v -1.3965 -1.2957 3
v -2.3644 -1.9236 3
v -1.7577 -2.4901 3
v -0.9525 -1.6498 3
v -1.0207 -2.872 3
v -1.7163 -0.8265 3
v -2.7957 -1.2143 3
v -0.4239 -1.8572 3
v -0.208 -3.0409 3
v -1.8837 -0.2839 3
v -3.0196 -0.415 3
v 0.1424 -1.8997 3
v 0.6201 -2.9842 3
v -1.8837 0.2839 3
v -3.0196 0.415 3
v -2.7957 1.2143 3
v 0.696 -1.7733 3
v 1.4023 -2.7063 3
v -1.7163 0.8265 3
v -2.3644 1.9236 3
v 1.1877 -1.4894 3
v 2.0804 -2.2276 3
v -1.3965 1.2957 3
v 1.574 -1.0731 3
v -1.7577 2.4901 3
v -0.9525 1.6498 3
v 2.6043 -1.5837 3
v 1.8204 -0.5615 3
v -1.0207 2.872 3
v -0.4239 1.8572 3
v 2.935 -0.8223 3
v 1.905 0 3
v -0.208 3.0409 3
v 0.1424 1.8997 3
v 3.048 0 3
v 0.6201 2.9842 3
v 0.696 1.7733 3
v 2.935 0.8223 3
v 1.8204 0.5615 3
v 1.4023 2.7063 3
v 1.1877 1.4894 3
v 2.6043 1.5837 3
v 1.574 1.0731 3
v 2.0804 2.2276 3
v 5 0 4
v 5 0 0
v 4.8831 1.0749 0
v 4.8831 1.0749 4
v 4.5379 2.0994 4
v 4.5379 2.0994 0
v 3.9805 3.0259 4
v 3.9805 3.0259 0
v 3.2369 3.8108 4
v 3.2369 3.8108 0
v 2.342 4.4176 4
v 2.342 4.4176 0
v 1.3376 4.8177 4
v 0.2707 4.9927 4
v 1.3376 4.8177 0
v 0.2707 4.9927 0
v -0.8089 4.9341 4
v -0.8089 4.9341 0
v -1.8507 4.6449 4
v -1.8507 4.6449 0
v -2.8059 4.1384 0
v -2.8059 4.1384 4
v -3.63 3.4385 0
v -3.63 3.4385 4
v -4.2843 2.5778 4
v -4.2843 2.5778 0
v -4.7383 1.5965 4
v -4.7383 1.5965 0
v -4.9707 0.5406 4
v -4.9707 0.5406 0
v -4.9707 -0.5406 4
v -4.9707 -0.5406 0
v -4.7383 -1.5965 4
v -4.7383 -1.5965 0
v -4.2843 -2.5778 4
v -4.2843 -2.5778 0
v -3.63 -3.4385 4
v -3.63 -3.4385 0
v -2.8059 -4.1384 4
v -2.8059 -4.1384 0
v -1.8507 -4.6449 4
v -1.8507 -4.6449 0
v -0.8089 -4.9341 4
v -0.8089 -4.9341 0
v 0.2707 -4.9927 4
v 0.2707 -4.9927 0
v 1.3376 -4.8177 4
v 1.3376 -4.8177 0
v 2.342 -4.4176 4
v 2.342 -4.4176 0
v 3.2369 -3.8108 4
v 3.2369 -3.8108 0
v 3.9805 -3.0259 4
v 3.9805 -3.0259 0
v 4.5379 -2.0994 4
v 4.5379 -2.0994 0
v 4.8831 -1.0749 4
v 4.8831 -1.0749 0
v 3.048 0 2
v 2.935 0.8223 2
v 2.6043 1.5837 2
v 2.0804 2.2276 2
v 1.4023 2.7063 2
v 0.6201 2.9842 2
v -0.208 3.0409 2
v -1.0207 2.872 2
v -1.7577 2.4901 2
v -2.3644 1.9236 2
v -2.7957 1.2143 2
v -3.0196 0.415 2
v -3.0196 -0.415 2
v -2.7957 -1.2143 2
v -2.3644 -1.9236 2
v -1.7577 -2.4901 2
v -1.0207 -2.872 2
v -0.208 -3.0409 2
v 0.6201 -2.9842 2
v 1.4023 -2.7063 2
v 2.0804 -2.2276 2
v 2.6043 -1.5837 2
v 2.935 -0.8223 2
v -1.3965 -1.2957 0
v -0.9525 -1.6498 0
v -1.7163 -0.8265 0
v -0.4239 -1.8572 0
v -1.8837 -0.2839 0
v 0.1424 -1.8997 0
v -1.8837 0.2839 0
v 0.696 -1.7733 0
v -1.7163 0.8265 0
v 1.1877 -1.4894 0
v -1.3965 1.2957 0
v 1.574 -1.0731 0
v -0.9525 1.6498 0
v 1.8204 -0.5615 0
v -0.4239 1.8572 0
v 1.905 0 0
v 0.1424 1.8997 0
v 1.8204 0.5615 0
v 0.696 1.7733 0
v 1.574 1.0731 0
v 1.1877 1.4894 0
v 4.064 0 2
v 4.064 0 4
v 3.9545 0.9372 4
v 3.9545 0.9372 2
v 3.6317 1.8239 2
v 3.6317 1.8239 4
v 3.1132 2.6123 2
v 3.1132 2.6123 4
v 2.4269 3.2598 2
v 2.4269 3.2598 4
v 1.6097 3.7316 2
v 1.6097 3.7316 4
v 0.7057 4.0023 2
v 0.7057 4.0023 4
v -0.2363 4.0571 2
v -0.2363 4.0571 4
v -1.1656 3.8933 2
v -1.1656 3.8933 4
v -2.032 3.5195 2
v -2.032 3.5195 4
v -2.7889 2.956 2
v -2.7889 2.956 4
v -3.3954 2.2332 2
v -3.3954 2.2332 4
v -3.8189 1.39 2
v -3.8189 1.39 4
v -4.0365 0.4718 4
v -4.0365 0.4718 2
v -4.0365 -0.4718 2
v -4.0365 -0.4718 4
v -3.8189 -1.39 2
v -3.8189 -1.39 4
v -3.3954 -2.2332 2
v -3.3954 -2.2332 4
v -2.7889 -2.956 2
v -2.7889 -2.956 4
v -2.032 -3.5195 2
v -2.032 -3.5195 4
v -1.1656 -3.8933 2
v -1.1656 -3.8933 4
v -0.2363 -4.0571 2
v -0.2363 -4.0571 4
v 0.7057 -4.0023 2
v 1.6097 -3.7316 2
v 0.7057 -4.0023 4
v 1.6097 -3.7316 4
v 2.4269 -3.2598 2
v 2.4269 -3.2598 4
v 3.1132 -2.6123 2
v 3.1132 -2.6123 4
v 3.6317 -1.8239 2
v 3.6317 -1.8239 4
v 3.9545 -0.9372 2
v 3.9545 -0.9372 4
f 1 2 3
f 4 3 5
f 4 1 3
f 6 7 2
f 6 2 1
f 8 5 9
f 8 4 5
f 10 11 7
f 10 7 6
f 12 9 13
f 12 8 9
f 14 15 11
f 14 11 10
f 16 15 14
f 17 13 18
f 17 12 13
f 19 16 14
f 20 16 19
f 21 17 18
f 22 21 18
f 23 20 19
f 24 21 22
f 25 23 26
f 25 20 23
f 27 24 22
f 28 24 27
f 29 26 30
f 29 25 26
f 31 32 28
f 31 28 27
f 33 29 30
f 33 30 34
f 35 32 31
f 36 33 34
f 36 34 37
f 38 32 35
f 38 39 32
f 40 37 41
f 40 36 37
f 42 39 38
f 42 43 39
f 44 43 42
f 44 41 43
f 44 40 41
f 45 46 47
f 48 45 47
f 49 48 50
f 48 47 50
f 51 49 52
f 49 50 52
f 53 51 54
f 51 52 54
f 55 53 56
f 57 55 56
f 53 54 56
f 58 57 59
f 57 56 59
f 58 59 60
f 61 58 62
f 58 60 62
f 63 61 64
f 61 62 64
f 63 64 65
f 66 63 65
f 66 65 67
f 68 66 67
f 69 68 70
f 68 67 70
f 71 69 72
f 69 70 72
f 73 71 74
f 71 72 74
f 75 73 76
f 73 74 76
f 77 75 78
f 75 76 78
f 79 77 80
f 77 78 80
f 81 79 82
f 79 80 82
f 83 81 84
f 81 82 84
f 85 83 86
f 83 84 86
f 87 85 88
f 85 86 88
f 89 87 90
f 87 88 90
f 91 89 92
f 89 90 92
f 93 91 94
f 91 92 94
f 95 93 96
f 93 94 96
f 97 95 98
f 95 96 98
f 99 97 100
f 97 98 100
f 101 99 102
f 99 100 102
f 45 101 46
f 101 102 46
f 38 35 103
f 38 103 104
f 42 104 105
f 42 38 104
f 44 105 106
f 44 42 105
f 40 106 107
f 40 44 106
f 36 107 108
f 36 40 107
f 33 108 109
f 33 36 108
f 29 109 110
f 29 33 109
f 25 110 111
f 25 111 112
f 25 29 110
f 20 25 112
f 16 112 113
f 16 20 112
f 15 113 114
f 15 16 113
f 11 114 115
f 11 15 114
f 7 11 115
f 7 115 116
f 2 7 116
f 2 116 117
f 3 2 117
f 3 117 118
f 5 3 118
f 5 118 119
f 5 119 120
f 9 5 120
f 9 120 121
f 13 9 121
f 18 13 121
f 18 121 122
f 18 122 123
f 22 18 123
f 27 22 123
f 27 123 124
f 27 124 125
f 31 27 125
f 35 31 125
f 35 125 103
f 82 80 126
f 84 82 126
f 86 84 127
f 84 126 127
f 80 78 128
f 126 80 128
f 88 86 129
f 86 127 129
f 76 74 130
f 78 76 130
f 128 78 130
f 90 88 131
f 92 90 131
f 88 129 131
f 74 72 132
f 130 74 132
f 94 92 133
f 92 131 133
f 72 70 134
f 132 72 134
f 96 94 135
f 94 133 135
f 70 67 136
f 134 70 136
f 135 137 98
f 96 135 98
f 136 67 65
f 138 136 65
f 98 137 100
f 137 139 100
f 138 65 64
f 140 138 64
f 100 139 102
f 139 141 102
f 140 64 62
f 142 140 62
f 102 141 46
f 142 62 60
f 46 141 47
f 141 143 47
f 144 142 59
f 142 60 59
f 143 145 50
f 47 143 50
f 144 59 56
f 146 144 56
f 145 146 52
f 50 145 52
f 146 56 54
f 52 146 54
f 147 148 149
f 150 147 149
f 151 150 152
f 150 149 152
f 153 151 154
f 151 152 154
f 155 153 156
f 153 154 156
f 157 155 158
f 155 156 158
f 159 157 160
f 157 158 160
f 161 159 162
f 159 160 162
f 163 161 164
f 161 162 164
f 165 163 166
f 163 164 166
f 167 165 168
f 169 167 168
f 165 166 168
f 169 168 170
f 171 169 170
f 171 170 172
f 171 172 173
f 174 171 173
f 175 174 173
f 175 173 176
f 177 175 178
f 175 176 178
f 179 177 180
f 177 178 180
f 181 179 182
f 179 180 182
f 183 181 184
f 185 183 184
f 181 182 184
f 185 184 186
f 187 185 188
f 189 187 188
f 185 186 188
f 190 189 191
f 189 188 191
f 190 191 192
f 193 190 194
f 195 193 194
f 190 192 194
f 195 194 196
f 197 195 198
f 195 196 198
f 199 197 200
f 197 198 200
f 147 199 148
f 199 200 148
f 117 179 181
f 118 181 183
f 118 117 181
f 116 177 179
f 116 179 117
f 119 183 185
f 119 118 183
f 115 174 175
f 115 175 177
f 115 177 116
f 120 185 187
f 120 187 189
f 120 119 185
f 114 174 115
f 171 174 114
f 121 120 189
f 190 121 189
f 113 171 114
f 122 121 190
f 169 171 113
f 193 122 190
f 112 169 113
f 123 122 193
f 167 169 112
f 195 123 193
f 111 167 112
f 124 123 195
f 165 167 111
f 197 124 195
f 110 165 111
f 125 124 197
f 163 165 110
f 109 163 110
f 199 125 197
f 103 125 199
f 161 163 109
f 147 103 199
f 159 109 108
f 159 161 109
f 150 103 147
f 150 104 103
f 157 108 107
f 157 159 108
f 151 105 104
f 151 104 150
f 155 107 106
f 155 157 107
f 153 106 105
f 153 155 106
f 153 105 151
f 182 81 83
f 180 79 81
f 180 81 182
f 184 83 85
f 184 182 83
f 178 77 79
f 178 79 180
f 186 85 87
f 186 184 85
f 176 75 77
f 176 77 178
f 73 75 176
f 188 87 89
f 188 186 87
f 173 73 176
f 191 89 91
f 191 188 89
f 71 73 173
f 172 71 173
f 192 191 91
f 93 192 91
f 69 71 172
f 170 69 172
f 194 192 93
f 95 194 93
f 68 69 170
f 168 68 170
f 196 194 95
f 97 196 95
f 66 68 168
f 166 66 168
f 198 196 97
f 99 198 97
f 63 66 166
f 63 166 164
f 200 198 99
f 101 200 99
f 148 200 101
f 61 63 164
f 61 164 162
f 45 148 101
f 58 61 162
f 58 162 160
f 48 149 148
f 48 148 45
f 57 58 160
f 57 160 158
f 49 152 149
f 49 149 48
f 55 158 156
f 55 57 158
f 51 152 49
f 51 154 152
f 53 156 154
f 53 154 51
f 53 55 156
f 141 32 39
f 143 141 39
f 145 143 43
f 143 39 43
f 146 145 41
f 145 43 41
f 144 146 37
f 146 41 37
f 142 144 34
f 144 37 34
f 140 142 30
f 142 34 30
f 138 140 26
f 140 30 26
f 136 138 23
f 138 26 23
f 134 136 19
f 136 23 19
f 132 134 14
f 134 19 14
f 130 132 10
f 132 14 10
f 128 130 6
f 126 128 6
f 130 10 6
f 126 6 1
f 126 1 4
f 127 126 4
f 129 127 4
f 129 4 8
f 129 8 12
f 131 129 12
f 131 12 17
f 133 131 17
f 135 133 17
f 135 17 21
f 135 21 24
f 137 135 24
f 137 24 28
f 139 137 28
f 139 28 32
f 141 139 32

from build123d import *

# Parameters (mm, degrees)
F0_R      = 5
F1_DEPTH  = 4
F2_R      = 4.064
F2_R_2    = 3.048
F3_DEPTH  = 2
F3_FACE_R = 3.048
F4_DEPTH  = 1
F5_R      = 1.905
F6_DEPTH  = 25.4


with BuildPart() as f1:
    # F0 (on Top) → F1 (new body)
    with BuildSketch(Plane.XY):
        Circle(F0_R)
    extrude(amount=F1_DEPTH)

    # F2 (on face) → F3 (cut)
    with BuildSketch(Plane.XY.offset(4)):
        Circle(F2_R)
        Circle(F2_R_2, mode=Mode.SUBTRACT)
    extrude(amount=-F3_DEPTH, mode=Mode.SUBTRACT)

    # F3_face (on face) → F4 (cut)
    with BuildSketch(Plane.XY.offset(4)):
        Circle(F3_FACE_R)
    extrude(amount=-F4_DEPTH, mode=Mode.SUBTRACT)

    # F5 (on face) → F6 (cut)
    with BuildSketch(Plane.XY.offset(3)):
        Circle(F5_R)
    extrude(amount=-F6_DEPTH, mode=Mode.SUBTRACT)


solid = f1.part
